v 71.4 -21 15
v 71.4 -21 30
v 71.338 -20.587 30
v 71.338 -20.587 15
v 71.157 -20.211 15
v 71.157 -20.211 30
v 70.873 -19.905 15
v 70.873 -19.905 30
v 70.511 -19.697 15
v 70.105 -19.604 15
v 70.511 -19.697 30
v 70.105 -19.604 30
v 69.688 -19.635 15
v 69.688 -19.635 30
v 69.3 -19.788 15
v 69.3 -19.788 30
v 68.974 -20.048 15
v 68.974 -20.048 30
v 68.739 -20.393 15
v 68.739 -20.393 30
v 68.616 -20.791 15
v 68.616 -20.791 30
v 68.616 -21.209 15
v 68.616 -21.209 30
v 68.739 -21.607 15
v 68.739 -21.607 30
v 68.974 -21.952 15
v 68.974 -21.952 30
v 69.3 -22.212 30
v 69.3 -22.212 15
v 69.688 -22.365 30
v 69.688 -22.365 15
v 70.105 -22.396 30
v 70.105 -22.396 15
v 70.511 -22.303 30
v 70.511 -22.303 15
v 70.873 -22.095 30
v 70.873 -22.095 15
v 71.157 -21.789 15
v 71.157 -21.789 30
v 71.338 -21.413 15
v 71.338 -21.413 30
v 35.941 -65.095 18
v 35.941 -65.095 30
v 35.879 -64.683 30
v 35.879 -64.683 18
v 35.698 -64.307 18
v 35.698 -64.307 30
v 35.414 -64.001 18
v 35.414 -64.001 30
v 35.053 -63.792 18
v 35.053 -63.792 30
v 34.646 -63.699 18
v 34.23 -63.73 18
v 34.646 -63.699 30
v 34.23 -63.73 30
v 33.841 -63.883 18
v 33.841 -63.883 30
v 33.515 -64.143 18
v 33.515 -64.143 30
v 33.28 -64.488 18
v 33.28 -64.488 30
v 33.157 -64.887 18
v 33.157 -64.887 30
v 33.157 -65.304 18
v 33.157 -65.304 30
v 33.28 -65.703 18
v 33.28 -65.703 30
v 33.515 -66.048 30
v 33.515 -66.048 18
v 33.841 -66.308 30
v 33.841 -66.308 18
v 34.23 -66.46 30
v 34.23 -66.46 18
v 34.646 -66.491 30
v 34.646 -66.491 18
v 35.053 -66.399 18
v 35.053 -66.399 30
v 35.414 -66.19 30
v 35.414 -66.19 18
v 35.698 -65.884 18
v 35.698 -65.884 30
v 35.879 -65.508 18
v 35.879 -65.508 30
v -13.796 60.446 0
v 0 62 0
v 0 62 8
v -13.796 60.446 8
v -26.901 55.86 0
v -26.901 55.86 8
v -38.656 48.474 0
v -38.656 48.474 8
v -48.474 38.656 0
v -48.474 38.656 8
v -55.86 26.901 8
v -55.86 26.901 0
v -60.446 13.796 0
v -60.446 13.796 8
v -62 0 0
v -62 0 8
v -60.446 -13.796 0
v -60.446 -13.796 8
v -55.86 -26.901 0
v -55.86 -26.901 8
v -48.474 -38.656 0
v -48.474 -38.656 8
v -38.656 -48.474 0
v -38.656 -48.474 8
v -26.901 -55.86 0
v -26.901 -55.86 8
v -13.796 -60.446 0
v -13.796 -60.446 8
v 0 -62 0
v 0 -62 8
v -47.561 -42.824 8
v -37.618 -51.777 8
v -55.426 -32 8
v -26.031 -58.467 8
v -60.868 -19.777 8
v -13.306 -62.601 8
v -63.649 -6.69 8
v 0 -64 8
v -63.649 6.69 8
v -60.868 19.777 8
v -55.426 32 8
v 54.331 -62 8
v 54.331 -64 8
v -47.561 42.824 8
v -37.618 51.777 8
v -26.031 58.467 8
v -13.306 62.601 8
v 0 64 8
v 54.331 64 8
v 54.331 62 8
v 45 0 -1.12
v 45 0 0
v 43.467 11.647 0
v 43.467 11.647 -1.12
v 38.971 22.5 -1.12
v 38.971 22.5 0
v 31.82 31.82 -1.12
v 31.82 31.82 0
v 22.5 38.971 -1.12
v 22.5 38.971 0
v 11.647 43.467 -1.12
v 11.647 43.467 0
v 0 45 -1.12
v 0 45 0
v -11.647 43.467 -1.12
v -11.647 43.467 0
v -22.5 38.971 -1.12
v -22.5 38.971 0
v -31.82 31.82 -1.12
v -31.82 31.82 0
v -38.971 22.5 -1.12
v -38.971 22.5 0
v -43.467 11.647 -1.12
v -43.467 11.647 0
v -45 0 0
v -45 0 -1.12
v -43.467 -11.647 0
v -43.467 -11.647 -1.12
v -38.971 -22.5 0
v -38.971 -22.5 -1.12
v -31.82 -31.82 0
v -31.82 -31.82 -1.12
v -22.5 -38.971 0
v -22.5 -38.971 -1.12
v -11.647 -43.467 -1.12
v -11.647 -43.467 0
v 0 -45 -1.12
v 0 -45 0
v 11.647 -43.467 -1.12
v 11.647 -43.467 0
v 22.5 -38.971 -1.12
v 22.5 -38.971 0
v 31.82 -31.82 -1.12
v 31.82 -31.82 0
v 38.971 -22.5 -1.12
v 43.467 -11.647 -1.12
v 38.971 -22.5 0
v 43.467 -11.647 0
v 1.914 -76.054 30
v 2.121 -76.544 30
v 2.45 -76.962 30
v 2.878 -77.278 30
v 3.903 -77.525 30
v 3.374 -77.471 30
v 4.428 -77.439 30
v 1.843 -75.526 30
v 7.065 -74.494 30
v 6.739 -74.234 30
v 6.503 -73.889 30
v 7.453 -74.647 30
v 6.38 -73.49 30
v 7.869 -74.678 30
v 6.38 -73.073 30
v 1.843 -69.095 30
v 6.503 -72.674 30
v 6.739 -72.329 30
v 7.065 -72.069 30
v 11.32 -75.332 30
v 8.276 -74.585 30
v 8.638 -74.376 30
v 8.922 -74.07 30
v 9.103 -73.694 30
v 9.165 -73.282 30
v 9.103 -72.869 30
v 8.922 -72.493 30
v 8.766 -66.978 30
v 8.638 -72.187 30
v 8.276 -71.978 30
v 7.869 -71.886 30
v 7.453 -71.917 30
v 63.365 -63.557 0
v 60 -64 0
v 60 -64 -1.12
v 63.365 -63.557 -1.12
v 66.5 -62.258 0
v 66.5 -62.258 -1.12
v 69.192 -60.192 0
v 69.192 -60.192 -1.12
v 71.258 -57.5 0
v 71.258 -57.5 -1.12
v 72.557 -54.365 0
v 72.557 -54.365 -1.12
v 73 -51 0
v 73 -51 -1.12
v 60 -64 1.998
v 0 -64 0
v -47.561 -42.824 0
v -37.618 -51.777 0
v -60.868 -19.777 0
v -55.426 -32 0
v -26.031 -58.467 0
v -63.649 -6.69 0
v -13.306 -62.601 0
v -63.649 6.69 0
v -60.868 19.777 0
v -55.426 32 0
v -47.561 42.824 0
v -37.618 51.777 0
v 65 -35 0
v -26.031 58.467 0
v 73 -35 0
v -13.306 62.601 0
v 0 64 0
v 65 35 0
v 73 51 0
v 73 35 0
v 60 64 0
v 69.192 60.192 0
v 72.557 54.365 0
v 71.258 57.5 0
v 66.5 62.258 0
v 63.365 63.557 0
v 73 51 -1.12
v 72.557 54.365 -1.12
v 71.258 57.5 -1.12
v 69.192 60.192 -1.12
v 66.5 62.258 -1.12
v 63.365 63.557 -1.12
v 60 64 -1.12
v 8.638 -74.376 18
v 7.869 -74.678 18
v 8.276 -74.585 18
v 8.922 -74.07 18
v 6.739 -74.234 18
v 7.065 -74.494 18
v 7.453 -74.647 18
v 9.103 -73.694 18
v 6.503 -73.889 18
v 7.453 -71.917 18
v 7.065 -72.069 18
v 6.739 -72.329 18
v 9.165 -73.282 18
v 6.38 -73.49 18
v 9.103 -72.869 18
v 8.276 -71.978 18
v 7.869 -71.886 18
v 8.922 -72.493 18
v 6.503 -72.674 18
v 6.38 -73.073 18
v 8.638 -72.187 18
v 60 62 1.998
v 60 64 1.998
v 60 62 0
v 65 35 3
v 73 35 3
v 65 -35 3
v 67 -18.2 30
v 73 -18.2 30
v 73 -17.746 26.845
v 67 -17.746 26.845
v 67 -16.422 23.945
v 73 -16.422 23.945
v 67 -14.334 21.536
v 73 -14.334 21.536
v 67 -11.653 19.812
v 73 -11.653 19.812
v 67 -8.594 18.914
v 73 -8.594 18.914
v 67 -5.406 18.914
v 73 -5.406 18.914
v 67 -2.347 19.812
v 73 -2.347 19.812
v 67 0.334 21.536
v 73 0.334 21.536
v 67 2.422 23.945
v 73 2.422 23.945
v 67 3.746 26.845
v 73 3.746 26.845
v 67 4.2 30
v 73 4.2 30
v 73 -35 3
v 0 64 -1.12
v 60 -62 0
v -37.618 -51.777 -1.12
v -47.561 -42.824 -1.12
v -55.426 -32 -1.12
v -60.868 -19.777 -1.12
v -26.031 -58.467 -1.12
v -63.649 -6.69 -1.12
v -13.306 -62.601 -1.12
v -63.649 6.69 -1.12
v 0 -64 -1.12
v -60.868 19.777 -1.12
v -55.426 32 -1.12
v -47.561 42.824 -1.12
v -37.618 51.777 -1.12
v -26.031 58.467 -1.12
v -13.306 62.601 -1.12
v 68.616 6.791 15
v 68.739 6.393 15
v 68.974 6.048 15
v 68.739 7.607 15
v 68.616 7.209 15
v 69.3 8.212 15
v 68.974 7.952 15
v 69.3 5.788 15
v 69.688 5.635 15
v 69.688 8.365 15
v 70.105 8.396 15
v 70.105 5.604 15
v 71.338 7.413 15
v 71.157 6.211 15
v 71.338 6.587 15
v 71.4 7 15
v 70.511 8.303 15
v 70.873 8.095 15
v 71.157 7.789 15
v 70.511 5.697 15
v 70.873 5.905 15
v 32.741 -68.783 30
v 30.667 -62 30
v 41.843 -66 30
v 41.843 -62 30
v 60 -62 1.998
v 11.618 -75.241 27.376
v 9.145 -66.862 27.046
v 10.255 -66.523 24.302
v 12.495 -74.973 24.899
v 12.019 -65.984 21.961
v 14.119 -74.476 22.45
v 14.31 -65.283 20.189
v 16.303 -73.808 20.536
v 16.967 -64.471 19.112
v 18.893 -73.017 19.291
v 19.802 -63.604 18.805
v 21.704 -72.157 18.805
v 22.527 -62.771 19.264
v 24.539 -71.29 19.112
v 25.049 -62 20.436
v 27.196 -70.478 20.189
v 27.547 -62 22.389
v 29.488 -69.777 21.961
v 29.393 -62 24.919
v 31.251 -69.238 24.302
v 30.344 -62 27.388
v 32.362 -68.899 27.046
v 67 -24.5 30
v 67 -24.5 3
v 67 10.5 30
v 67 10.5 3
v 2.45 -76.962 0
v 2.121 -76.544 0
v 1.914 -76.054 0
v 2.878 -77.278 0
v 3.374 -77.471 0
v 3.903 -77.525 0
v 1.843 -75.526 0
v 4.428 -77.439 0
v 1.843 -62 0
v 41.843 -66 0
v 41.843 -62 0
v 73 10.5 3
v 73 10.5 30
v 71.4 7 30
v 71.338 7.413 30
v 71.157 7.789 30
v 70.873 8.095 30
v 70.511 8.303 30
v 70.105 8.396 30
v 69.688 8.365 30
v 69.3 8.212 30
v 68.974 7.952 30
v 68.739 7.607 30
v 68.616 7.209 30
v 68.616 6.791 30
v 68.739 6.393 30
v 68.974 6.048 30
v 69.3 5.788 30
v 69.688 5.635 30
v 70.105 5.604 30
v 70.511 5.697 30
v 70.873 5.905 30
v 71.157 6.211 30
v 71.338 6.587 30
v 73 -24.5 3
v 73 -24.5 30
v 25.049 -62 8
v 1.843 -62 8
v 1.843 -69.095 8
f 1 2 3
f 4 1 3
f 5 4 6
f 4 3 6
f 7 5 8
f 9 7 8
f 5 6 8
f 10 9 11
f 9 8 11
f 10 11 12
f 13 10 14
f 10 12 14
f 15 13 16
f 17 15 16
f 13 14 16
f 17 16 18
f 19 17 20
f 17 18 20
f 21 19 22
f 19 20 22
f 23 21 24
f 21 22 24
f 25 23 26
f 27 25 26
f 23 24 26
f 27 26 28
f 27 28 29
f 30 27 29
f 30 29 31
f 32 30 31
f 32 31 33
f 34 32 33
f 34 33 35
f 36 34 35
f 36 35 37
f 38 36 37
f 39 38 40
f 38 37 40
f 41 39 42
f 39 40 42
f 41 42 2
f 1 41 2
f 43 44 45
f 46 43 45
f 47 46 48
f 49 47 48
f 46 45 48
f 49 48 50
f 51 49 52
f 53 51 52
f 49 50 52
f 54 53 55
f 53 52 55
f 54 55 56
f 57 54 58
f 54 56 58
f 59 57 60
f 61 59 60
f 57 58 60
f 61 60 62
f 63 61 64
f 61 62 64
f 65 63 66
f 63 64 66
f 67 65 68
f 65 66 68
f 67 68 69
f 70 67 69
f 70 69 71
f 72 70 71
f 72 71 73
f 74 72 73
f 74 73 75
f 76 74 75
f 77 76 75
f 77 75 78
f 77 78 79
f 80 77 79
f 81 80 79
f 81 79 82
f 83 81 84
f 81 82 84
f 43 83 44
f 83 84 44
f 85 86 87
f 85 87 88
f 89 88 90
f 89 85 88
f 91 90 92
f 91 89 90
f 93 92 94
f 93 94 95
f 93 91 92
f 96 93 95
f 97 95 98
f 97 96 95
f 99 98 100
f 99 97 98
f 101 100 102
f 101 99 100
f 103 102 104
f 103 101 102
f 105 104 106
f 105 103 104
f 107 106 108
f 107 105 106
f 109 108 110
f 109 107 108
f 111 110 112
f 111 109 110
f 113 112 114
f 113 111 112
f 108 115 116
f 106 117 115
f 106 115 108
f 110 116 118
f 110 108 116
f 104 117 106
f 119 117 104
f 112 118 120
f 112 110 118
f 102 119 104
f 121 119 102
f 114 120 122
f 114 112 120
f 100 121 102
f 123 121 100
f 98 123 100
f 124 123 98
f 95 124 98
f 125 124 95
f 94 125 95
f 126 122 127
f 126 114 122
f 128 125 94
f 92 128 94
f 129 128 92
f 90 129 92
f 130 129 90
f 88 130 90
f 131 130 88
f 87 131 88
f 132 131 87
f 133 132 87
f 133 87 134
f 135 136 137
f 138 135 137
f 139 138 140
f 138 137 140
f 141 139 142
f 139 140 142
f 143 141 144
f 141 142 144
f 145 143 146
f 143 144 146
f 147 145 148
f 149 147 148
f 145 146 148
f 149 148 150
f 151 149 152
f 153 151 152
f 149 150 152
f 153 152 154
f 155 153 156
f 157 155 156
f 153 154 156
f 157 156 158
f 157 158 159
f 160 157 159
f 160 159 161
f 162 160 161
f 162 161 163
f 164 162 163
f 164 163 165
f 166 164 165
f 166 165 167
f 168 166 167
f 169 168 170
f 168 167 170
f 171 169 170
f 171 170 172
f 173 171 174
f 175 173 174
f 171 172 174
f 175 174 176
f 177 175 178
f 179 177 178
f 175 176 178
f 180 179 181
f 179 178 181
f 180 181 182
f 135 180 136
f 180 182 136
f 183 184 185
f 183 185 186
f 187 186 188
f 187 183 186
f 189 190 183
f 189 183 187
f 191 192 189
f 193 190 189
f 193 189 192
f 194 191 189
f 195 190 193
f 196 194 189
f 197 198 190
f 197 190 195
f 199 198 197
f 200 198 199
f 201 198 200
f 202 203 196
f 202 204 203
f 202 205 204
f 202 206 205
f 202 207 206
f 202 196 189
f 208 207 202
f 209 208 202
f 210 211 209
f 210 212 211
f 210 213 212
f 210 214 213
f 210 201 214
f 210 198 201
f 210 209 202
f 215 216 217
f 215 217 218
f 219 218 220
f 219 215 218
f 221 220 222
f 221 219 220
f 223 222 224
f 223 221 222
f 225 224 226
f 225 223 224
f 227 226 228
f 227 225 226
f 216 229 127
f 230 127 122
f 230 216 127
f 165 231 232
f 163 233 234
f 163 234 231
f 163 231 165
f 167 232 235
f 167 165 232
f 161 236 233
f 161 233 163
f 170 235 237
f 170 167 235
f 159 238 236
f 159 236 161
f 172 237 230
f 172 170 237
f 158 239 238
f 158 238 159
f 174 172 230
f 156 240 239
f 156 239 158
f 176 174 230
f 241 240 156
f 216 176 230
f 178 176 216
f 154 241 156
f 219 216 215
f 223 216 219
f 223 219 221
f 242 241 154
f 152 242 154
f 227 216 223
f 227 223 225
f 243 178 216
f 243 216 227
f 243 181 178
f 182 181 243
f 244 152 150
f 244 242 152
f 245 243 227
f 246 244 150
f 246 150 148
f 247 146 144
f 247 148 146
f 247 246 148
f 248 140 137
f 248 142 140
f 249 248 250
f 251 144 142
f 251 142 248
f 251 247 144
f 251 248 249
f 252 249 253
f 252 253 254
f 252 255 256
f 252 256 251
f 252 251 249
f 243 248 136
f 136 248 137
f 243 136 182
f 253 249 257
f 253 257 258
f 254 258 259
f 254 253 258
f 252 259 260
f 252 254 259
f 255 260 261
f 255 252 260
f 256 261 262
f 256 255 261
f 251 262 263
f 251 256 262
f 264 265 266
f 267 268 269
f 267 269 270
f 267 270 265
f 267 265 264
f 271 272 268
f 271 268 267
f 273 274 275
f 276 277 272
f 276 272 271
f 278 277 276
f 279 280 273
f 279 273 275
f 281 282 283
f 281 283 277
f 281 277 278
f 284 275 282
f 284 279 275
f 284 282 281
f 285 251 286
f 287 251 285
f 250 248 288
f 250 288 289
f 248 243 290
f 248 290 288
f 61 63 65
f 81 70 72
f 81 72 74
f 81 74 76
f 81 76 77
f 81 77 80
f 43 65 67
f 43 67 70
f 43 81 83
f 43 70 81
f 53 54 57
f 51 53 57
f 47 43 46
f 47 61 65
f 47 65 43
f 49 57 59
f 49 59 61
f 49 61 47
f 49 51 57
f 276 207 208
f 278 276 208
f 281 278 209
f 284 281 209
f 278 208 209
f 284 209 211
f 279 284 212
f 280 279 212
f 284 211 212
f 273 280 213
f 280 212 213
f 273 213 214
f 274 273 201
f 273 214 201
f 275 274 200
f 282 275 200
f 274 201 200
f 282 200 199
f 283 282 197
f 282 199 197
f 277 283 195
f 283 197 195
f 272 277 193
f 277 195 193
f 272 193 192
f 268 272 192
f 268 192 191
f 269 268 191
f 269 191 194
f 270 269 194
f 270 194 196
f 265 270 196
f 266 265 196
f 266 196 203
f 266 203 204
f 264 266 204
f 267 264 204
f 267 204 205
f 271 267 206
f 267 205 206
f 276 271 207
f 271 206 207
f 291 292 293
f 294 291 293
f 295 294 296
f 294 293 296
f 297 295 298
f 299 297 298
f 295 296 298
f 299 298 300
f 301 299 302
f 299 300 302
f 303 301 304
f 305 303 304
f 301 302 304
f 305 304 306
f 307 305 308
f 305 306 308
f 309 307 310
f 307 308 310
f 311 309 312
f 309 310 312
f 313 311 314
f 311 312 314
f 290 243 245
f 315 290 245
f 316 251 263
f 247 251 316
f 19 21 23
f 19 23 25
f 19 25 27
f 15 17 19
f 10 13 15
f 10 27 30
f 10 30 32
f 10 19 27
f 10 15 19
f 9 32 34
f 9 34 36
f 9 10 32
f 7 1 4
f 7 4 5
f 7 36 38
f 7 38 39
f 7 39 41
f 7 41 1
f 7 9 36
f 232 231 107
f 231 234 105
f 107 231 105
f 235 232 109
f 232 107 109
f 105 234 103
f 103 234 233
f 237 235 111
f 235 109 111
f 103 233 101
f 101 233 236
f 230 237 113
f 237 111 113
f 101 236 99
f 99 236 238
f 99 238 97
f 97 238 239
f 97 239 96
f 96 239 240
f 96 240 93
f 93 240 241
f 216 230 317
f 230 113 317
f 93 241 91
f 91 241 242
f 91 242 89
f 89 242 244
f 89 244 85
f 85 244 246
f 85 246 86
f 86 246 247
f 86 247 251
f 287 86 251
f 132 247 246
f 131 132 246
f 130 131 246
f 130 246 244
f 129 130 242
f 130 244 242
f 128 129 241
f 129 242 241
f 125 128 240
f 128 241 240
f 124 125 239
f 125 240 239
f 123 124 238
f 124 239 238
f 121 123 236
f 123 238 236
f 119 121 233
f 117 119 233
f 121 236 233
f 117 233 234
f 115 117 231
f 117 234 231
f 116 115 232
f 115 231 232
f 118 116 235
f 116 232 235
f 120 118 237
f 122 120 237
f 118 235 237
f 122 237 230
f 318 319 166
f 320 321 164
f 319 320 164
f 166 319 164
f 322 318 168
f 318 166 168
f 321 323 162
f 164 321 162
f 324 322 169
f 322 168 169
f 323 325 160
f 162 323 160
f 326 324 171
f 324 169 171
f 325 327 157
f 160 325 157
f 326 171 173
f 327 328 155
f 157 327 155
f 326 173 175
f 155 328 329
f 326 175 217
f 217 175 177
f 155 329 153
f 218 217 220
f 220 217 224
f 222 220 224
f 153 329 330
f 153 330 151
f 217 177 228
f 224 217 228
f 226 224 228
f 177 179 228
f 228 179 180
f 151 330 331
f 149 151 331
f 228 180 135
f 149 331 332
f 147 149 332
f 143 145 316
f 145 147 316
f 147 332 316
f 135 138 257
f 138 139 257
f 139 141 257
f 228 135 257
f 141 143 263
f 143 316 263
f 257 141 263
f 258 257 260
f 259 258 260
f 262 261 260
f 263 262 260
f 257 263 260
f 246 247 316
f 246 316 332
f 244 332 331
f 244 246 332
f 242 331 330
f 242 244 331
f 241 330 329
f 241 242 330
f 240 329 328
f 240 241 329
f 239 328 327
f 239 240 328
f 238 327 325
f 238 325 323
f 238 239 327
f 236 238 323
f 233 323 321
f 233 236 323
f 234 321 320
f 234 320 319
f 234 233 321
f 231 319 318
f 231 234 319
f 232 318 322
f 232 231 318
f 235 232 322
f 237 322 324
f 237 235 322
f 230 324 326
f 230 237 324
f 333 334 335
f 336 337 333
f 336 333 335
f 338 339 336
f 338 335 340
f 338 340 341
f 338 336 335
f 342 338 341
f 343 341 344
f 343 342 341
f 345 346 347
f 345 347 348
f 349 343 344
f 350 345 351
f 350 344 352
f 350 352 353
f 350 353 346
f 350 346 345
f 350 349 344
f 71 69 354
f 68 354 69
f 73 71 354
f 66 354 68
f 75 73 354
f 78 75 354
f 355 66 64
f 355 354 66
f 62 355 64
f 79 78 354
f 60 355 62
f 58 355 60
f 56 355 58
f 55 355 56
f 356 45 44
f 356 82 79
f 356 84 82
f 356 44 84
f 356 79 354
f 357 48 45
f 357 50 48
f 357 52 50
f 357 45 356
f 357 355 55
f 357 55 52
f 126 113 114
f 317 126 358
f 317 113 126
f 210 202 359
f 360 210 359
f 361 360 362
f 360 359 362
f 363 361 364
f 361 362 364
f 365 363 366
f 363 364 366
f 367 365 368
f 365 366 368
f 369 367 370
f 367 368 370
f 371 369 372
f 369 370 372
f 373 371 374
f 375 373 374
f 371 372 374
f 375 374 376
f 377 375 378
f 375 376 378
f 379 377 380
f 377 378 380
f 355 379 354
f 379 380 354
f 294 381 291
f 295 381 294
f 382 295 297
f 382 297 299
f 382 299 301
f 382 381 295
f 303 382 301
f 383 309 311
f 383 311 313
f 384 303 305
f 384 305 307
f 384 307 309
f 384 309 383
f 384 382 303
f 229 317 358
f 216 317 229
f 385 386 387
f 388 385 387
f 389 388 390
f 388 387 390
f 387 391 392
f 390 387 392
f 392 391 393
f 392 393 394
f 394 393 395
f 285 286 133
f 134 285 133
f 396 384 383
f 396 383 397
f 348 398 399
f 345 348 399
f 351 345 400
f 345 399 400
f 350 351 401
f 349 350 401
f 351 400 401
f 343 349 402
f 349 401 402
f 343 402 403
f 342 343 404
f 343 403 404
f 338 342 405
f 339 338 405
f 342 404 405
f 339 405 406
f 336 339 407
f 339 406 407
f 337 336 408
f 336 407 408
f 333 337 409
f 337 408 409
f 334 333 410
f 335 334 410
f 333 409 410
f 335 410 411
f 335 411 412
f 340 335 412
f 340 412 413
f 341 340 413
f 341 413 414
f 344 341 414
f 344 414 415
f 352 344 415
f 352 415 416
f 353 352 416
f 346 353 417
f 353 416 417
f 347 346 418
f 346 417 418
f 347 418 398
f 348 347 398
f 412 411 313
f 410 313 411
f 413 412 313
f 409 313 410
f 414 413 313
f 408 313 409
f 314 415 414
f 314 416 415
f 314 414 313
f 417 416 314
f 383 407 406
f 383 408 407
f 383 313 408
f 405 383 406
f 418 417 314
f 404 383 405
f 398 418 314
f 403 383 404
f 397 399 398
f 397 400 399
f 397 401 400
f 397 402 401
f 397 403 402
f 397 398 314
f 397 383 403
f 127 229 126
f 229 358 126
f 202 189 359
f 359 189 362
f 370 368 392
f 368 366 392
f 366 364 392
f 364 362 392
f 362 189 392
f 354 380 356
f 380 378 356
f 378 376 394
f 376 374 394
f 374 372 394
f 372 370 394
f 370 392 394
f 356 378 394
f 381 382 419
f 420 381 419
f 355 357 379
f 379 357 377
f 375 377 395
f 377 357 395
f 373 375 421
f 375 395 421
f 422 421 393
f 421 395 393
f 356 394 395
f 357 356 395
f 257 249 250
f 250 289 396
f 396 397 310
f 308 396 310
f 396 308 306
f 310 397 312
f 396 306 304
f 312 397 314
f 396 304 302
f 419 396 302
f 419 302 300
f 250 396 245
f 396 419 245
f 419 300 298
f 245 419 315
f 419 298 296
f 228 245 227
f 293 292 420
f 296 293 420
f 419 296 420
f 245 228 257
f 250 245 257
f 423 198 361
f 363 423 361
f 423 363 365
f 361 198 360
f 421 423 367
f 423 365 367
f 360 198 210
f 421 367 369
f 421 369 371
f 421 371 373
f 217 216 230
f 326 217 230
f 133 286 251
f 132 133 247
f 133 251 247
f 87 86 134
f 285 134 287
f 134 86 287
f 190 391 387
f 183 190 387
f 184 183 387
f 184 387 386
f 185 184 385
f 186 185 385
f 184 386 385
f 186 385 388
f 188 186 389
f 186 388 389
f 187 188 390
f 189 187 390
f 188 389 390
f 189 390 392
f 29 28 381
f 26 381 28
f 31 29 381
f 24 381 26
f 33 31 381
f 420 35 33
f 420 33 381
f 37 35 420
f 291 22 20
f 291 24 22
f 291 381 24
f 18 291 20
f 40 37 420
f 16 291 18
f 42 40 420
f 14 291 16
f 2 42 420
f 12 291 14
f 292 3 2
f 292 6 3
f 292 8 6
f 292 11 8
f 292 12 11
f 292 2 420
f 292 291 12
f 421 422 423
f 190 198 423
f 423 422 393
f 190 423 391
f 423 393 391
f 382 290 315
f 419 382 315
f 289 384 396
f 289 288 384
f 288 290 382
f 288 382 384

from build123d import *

# Parameters (mm, degrees)
PAD001_DEPTH    = 8
POCKET005_DEPTH = 128.001
PAD005_DEPTH    = 30
SKETCH005_R     = 11.2
POCKET_DEPTH    = 15.566959
POCKET006_DEPTH = 22
SKETCH012_R     = 1.4
POCKET007_DEPTH = 12
SKETCH001_R     = 45
PAD_DEPTH       = 1.12
SKETCH_W        = 8
SKETCH_H        = 70
PAD003_DEPTH    = 3
SKETCH008_W     = 6
SKETCH008_H     = 35
PAD004_DEPTH    = 27
SKETCH009_R     = 11.2
POCKET008_DEPTH = 137.000918
SKETCH013_R     = 1.4
POCKET009_DEPTH = 15


with BuildPart() as bevel_connector:
    # Sketch002 → Pad001 (new body)
    with BuildSketch(Plane.XY):
        with BuildLine():
            Line((60, 64), (0, 64))
            ThreePointArc((0, 64), (-63.999936, 0), (0, -64))
            Line((60, -64), (0, -64))
            Line((60, -62), (60, -64))
            Line((0, -62), (60, -62))
            ThreePointArc((0, 62), (-61.999985, 0), (0, -62))
            Line((0, 62), (60, 62))
            Line((60, 64), (60, 62))
        make_face()
    extrude(amount=PAD001_DEPTH)

    # Sketch011 → Pocket005 (cut, through all)
    with BuildSketch(Plane(origin=(0, 64, 0), x_dir=(-1, 0, 0), z_dir=(0, 1, 0))):
        Polygon((-53.9525, 8.40024), (-64.202263, 10.836407), (-61.187164, 0.741769), align=None)
    extrude(amount=-POCKET005_DEPTH, mode=Mode.SUBTRACT)


with BuildPart() as pocket007:
    # Sketch004 → Pad005 (new body)
    with BuildSketch(Plane.XY):
        with BuildLine():
            Line((41.843105, -62), (1.843105, -62))
            Line((1.843105, -62), (1.843105, -75.526382))
            ThreePointArc((1.843105, -75.526382), (2.653459, -77.134096), (4.427848, -77.438992))
            Line((4.427848, -77.438992), (41.843105, -66))
            Line((41.843105, -66), (41.843105, -62))
        make_face()
    extrude(amount=PAD005_DEPTH)

    # Sketch005 → Pocket (cut, through all)
    with BuildSketch(Plane(origin=(22.043577, -72.101291, 0), x_dir=(0.956305, 0.292372, 0), z_dir=(0.292372, -0.956305, 0))):
        with Locations((0, 30)):
            Circle(SKETCH005_R)
    extrude(amount=-POCKET_DEPTH, mode=Mode.SUBTRACT)

    # Sketch007 → Pocket006 (cut)
    with BuildSketch(Plane.XY.offset(30)):
        Polygon((-4.66376, -53.953282), (-5.90948, -71.46493), (38.1328, -58.000022), (37.116007, -54.0061), align=None)
    extrude(amount=-POCKET006_DEPTH, mode=Mode.SUBTRACT)

    # Sketch012 → Pocket007 (cut)
    with BuildSketch(Plane.XY.offset(30)):
        with Locations((7.764783, -73.281713)):
            Circle(SKETCH012_R)
        with Locations((34.541317, -65.095305)):
            Circle(SKETCH012_R)
    extrude(amount=-POCKET007_DEPTH, mode=Mode.SUBTRACT)


with BuildPart() as pocket009:
    # Sketch001 → Pad (new body)
    with BuildSketch(Plane.XY):
        with BuildLine():
            Line((60, 64), (0, 64))
            ThreePointArc((0, 64), (-63.999918, 0), (0, -64))
            Line((60, -64), (0, -64))
            ThreePointArc((60, -64), (69.192388, -60.192388), (73, -51))
            Line((73, 51), (73, -51))
            ThreePointArc((73, 51), (69.192388, 60.192388), (60, 64))
        make_face()
        Circle(SKETCH001_R, mode=Mode.SUBTRACT)
    extrude(amount=-PAD_DEPTH)

    # Sketch → Pad003 (new body)
    with BuildSketch(Plane.XY):
        with Locations((69, 0)):
            Rectangle(SKETCH_W, SKETCH_H)
    extrude(amount=PAD003_DEPTH)

    # Sketch008 → Pad004 (new body)
    with BuildSketch(Plane.XY.offset(3)):
        with Locations((70, -7)):
            Rectangle(SKETCH008_W, SKETCH008_H)
    extrude(amount=PAD004_DEPTH)

    # Sketch009 → Pocket008 (cut, through all)
    with BuildSketch(Plane.YZ.offset(73)):
        with Locations((-7, 30)):
            Circle(SKETCH009_R)
    extrude(amount=-POCKET008_DEPTH, mode=Mode.SUBTRACT)

    # Sketch013 → Pocket009 (cut)
    with BuildSketch(Plane.XY.offset(30)):
        with Locations((70, 7)):
            Circle(SKETCH013_R)
        with Locations((70, -21)):
            Circle(SKETCH013_R)
    extrude(amount=-POCKET009_DEPTH, mode=Mode.SUBTRACT)


solid = Compound([bevel_connector.part, pocket007.part, pocket009.part])
